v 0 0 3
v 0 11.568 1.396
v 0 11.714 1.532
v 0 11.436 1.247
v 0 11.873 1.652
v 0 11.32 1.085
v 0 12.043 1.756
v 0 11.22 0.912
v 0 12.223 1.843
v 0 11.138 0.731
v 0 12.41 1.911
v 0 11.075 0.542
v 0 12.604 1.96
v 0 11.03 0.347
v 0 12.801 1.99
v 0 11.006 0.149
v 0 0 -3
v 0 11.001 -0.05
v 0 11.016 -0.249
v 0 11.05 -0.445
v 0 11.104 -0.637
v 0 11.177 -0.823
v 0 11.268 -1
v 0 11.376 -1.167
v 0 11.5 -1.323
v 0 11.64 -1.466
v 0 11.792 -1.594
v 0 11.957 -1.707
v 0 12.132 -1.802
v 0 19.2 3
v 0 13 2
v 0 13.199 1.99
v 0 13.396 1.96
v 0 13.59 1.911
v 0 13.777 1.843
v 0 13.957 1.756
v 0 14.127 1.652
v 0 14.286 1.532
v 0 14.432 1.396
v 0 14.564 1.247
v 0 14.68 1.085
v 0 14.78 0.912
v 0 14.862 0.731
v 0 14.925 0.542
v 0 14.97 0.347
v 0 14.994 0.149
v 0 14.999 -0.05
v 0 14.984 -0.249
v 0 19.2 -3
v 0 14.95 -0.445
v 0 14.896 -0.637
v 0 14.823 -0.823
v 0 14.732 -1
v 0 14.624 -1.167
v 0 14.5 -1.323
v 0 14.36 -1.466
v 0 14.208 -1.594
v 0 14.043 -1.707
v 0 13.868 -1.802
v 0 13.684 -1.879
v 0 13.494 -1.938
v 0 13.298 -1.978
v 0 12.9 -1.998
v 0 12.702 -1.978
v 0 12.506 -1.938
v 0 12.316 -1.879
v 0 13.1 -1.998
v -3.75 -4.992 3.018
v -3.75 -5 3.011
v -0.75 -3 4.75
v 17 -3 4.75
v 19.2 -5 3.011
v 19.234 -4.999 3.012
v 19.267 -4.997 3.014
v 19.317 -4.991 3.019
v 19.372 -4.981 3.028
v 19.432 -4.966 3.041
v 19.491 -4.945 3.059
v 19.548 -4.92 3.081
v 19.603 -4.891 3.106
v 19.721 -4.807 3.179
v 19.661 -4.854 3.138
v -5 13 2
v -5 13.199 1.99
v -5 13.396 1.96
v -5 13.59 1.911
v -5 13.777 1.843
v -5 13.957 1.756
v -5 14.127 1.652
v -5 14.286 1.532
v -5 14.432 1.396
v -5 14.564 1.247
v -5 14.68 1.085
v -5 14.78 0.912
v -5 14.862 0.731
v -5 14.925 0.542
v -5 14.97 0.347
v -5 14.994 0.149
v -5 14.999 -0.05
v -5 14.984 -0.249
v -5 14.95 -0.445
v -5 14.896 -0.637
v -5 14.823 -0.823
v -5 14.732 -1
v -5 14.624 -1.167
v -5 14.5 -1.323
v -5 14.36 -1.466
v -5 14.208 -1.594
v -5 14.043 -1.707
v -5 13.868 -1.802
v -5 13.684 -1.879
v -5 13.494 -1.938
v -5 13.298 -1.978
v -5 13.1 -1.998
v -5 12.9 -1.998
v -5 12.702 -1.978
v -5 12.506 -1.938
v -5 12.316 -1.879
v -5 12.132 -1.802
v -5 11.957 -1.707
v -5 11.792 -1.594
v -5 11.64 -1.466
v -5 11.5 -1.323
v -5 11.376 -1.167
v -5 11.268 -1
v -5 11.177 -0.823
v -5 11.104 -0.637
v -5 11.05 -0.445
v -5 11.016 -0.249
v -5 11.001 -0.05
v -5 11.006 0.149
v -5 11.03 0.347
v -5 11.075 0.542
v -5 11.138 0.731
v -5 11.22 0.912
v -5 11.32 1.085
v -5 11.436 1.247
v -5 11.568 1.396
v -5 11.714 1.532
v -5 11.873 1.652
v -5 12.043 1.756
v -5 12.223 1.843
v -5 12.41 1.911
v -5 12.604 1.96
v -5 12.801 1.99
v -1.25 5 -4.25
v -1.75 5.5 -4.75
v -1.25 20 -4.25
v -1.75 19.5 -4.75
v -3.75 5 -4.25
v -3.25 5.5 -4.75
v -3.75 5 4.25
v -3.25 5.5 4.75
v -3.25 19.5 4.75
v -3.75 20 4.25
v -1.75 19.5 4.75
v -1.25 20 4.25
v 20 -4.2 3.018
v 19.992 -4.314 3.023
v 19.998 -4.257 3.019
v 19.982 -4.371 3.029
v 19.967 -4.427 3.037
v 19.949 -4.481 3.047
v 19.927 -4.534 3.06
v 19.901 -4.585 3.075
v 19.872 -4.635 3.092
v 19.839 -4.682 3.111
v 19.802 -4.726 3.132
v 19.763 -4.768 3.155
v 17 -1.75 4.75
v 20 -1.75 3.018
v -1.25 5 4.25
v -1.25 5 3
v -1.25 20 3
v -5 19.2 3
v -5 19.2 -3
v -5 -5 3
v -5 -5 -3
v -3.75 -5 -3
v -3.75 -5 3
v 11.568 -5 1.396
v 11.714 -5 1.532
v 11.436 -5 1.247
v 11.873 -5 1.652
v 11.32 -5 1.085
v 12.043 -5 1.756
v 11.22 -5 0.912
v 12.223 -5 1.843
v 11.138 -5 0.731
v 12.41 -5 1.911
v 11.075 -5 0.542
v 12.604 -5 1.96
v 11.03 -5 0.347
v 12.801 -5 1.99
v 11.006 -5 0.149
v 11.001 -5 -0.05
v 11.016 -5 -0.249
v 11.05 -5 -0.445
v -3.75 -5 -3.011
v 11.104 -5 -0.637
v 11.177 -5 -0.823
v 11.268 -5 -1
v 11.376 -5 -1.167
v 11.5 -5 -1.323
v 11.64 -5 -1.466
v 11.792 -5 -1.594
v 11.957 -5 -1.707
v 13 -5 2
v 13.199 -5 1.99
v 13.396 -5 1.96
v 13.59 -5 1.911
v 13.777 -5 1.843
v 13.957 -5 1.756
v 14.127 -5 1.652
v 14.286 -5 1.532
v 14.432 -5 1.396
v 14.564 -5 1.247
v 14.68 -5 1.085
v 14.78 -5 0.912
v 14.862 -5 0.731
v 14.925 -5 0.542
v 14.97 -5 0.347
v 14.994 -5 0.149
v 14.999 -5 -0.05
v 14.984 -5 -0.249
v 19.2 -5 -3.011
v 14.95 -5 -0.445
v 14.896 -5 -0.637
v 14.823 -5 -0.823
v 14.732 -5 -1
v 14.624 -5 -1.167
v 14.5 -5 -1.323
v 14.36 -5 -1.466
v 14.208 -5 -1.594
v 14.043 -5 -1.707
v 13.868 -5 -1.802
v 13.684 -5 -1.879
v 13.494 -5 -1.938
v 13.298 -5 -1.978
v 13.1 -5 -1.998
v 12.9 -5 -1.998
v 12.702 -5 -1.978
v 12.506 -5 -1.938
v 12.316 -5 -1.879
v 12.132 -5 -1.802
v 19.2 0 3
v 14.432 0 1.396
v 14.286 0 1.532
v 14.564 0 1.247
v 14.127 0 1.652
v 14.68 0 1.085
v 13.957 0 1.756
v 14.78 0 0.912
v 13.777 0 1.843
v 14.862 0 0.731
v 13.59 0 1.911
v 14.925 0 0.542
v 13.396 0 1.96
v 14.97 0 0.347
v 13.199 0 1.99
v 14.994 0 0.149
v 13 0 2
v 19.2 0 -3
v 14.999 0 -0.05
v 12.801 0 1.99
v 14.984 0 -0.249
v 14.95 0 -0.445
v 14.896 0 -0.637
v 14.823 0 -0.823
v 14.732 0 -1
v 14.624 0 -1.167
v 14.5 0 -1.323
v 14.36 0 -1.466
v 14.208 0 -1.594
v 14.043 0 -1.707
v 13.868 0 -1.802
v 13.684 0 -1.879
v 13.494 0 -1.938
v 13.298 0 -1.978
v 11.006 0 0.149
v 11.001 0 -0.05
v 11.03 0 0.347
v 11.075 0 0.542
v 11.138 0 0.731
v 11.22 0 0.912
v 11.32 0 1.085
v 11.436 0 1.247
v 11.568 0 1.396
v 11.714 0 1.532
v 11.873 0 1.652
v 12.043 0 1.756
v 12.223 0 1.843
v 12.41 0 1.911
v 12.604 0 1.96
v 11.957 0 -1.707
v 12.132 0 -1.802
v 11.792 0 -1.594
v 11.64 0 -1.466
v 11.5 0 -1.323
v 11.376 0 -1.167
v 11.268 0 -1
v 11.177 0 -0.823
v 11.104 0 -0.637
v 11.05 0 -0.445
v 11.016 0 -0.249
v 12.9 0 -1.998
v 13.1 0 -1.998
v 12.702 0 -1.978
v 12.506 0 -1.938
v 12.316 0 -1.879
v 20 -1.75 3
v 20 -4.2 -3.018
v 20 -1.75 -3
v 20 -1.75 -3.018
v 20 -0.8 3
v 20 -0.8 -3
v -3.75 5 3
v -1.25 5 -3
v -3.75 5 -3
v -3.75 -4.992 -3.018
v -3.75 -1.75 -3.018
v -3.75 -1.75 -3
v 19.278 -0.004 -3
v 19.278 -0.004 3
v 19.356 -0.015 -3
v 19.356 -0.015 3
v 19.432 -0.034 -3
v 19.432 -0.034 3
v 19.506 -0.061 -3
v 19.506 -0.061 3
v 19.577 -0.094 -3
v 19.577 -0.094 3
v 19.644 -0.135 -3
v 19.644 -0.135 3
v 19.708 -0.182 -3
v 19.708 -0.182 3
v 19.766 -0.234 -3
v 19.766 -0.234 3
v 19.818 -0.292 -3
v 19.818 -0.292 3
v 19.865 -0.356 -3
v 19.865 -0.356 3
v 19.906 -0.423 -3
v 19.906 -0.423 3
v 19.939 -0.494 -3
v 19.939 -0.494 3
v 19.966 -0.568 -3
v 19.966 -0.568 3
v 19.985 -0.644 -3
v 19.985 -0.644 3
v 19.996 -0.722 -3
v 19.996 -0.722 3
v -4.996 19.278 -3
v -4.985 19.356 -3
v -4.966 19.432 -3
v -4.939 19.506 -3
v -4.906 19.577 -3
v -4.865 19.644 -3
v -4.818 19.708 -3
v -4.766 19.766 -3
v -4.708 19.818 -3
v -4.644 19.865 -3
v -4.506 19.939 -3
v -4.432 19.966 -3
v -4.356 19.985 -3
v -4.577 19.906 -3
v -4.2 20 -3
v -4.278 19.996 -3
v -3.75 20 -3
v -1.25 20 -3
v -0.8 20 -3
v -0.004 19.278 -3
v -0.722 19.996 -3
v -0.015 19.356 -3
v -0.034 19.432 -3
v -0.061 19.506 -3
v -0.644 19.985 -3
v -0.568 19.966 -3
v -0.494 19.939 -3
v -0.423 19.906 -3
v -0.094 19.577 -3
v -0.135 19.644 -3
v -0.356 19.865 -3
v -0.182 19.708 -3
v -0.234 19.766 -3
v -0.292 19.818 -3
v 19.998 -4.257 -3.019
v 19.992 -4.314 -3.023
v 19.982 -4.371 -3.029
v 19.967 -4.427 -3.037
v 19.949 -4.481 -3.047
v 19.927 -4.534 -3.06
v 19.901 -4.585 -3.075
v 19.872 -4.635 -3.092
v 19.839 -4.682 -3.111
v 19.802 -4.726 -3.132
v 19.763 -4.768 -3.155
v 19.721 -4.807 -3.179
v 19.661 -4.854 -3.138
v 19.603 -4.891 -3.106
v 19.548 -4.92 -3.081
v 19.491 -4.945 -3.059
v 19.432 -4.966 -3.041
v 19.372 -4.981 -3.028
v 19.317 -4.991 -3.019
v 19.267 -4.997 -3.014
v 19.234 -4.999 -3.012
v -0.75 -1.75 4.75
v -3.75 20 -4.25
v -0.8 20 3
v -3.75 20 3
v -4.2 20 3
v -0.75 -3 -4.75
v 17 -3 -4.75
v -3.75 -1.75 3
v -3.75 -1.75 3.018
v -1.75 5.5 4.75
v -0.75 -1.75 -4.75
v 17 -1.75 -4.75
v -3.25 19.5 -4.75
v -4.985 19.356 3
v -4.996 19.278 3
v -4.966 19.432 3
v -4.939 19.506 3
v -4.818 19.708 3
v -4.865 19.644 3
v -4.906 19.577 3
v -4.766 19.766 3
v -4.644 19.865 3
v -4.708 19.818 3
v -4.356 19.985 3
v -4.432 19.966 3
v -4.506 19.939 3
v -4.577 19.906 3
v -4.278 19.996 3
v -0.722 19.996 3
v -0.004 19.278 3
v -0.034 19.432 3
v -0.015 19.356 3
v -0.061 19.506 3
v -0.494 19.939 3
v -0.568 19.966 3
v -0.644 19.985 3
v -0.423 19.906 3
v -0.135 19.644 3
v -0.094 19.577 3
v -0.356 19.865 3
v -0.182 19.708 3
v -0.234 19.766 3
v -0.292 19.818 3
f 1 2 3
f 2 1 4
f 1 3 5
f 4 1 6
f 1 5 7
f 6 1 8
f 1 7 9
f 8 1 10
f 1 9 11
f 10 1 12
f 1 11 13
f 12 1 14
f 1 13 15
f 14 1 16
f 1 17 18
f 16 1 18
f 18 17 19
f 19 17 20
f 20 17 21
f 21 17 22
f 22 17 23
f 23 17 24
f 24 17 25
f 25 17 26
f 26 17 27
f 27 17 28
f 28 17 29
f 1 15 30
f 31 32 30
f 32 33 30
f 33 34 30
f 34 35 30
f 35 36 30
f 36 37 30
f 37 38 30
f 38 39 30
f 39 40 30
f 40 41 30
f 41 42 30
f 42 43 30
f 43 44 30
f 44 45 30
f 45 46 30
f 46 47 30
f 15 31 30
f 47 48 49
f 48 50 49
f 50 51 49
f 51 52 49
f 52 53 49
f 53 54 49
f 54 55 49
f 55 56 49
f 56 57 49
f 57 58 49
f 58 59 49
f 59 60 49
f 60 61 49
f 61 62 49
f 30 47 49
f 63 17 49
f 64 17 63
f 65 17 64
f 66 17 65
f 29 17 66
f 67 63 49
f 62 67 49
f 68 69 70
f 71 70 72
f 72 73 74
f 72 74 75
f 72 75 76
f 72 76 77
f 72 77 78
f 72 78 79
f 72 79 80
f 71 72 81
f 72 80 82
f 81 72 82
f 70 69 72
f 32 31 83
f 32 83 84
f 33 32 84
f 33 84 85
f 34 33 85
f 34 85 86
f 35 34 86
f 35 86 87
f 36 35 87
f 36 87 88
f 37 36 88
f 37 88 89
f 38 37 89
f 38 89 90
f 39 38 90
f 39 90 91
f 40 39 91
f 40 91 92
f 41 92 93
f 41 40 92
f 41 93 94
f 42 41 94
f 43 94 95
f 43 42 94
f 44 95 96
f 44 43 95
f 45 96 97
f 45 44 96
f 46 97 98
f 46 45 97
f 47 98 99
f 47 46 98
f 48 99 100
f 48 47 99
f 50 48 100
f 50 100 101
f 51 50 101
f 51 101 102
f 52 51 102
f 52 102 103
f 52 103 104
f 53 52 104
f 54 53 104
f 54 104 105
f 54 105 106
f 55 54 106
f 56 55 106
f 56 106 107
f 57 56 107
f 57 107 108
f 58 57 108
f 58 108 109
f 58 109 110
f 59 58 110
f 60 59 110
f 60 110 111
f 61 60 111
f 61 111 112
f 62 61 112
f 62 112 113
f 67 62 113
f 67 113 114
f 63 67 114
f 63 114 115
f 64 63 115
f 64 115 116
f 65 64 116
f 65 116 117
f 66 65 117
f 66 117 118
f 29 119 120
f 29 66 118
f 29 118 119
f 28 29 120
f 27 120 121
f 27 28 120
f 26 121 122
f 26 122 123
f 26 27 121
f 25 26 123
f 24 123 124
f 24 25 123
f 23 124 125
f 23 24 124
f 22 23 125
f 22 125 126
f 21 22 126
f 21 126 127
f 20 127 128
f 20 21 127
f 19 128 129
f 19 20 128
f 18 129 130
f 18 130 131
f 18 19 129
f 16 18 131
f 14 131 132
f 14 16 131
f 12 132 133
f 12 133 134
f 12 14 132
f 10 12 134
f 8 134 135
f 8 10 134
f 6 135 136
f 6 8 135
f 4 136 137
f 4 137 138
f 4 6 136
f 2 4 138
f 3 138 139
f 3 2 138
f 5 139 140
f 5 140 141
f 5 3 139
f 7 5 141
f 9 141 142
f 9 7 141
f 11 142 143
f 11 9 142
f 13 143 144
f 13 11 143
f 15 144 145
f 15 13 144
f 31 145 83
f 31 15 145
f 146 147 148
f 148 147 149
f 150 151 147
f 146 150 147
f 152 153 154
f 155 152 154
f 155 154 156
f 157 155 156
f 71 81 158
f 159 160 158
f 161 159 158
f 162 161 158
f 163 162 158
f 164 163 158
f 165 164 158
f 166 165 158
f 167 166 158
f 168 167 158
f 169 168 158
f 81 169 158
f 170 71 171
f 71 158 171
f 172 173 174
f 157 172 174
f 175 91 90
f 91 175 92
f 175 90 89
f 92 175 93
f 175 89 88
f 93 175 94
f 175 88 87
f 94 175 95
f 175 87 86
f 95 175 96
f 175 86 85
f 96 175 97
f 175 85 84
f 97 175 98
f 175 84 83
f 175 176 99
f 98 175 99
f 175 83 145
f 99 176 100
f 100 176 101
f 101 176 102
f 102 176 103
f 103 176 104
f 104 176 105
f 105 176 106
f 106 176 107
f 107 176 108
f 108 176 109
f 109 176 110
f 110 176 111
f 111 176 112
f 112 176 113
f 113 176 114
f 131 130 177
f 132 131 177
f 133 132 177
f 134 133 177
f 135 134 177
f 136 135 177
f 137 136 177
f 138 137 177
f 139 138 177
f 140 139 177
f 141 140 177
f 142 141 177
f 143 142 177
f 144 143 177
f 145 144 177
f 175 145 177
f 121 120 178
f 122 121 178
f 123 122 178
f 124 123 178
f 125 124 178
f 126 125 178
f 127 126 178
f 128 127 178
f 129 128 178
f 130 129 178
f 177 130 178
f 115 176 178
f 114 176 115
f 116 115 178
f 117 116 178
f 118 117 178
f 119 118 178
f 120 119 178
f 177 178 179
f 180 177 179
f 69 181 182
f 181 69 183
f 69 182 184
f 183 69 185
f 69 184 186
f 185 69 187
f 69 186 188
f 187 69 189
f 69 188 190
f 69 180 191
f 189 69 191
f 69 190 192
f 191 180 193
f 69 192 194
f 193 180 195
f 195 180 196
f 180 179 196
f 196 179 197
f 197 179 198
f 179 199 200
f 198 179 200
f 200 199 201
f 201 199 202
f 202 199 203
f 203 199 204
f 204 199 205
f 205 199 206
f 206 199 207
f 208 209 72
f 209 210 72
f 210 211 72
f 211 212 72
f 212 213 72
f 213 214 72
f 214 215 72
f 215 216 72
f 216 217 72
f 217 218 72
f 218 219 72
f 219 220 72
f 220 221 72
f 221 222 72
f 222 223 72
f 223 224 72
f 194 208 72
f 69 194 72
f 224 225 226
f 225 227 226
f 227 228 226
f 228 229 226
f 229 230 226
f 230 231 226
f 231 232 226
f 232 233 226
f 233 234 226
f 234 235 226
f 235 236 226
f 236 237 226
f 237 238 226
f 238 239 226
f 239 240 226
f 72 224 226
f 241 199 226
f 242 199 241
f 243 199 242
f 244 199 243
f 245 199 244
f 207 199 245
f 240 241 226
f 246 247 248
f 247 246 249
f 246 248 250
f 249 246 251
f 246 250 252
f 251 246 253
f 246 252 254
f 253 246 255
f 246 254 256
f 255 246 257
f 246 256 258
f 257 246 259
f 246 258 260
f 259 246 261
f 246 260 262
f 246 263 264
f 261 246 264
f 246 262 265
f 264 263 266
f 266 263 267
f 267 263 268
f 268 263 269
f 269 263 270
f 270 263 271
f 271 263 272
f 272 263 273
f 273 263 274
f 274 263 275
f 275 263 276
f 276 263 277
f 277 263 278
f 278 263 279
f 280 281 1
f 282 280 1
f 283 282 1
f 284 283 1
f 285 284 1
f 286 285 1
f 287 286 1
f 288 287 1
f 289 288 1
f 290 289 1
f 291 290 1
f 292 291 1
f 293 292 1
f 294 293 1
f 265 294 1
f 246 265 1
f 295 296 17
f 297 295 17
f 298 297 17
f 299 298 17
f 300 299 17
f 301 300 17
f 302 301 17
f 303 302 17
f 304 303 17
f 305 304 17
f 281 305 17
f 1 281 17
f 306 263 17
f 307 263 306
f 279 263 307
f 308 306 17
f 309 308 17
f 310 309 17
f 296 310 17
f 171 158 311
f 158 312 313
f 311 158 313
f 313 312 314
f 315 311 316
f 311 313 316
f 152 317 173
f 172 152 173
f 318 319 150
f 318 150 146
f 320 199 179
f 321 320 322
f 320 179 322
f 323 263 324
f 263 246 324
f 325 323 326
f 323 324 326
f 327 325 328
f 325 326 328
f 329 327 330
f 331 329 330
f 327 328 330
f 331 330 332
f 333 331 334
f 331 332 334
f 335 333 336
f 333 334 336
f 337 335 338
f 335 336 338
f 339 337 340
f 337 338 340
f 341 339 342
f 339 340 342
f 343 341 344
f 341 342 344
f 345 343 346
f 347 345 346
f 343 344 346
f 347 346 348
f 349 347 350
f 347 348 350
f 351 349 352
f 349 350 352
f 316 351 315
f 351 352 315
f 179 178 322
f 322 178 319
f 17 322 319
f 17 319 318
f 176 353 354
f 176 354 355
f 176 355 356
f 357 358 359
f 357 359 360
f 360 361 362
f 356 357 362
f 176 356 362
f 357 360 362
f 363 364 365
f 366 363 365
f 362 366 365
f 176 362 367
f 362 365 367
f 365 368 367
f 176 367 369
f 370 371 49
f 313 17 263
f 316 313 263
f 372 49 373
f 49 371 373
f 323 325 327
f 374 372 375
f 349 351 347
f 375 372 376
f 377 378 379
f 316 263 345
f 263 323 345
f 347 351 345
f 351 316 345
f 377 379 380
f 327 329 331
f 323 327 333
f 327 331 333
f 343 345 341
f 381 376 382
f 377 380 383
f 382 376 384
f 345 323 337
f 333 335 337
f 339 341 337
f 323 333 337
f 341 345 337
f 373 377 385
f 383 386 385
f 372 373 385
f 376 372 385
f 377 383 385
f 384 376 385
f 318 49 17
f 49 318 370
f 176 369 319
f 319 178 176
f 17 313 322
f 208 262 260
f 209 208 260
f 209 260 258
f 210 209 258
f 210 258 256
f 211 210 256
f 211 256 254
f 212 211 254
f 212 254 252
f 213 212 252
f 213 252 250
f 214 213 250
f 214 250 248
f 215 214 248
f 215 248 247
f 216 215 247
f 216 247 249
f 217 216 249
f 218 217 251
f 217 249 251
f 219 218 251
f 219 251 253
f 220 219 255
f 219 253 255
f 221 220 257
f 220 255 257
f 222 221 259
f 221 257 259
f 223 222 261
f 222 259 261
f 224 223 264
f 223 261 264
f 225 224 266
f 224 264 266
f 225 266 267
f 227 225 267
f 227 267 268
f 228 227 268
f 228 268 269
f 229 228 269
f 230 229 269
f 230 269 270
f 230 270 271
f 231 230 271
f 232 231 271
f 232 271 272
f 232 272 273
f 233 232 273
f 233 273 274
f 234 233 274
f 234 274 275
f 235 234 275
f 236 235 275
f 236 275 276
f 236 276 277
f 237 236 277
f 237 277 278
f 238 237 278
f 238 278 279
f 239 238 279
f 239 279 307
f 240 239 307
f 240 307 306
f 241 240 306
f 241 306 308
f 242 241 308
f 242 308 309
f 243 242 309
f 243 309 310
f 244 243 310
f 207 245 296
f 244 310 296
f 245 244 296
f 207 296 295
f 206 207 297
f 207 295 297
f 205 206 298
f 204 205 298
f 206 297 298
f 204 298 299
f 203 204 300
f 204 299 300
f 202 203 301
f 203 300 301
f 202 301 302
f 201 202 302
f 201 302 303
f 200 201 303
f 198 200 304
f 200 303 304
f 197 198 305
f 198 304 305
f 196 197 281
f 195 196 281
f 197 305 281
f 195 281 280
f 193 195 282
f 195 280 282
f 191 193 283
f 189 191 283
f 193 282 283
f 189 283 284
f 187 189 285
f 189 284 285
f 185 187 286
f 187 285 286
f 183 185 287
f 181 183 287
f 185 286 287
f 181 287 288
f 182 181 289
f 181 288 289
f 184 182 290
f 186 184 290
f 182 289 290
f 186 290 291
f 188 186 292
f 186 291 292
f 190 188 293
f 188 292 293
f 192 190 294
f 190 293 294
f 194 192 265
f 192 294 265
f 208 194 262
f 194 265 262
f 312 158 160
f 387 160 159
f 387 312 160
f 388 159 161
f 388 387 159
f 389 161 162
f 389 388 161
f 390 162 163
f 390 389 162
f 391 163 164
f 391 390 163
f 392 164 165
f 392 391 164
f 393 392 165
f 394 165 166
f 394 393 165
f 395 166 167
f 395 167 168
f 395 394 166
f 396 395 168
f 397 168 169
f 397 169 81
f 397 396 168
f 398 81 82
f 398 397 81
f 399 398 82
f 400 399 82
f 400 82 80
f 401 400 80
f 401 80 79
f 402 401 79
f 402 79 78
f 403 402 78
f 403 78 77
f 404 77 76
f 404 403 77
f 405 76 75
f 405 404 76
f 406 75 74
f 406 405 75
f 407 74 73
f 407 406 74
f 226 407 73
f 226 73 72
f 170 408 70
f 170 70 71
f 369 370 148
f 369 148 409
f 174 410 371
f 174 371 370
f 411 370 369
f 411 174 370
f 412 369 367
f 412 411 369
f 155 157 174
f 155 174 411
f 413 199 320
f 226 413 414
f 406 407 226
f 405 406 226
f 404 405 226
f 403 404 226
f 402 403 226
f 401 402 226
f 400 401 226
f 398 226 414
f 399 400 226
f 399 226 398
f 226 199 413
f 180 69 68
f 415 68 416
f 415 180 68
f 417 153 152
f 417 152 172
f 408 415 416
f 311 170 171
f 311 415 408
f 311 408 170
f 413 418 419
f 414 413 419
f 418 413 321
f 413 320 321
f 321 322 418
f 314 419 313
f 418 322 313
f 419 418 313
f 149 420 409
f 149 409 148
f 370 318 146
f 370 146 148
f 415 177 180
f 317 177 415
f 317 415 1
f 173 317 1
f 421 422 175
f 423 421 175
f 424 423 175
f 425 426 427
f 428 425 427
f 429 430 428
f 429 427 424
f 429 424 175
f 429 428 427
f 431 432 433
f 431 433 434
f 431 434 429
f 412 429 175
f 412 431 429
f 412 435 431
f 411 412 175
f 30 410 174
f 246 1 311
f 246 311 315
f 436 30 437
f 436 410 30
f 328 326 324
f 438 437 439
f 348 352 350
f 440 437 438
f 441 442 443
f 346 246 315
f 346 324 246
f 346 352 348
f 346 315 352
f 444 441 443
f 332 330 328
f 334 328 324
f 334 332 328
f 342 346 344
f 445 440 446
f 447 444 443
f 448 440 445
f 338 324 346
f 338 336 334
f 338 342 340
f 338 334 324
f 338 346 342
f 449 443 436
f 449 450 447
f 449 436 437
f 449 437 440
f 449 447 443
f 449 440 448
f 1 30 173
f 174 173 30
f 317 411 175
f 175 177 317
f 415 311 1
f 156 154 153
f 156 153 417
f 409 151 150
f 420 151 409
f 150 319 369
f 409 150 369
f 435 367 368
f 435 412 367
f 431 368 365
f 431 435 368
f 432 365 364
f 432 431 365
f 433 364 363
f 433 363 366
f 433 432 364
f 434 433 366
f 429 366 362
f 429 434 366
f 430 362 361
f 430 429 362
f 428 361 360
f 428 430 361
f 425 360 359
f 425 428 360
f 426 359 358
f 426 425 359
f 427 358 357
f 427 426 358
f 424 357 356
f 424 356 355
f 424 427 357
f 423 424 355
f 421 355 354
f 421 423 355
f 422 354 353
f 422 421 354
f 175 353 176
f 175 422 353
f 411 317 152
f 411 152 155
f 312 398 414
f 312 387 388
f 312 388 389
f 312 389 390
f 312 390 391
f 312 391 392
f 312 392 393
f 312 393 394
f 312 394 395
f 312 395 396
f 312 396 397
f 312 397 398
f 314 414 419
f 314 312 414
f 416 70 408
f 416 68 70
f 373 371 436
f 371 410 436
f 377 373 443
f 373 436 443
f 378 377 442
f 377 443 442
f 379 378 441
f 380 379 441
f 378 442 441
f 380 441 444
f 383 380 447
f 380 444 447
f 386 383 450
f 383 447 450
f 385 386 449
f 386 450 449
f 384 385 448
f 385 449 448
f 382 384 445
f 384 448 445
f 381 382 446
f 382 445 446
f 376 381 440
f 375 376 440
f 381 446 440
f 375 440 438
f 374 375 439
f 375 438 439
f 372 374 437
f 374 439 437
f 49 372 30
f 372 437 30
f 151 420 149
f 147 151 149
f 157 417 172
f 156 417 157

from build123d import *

# Parameters (mm, degrees)
EXTRUDE1_DEPTH      = 3
EXTRUDE1_DEPTH_BACK = 3
SKETCH2_W           = 2.5
SKETCH2_H           = 15
SKETCH2_W_2         = 23.75
SKETCH2_H_2         = 3.25
EXTRUDE2_DEPTH      = 1.75
CHAMFER1_SIZE       = 3
CHAMFER1_SIZE2      = 1.732050808
CHAMFER2_SIZE       = 2
CHAMFER2_SIZE2      = 1.738573476
CHAMFER3_SIZE       = 0.5
EXTRUDE3_REACH      = 30.68
SKETCH4_R           = 2
FILLET1_R           = 0.8


# Read off the part's stored shape, not the designer's step: Mirror1
with BuildPart() as part:
    # Sketch1 → Extrude1 (new, two sides: drawn at the far end of the back side and taken through both)
    with BuildSketch(Plane.XY.offset(-EXTRUDE1_DEPTH_BACK)):
        Polygon((0, 0), (0, 20), (-5, 20), (-5, -5), (20, -5), (20, 0), align=None)
    extrude(amount=EXTRUDE1_DEPTH + EXTRUDE1_DEPTH_BACK)

    # Sketch2 → Extrude2 (add)
    with BuildSketch(Plane.XY.offset(3)):
        with Locations((-2.5, 12.5)):
            Rectangle(SKETCH2_W, SKETCH2_H)
        with Locations((8.125, -3.375)):
            Rectangle(SKETCH2_W_2, SKETCH2_H_2)
    extrude(amount=EXTRUDE2_DEPTH)

    # Chamfer1
    chamfer1_edges = [part.edges().sort_by_distance(p)[0] for p in [
        (20, -3.375, 4.75),
        (-3.75, -3.375, 4.75),
    ]]
    chamfer1_side = [part.faces().sort_by_distance(p)[0] for p in [
        (8.125, -3.375, 4.75),
    ]]
    chamfer(chamfer1_edges, length=CHAMFER1_SIZE, length2=CHAMFER1_SIZE2, reference=chamfer1_side[0])

    # Chamfer2
    chamfer2_edges = [part.edges().sort_by_distance(p)[0] for p in [
        (8.125, -5, 4.75),
    ]]
    chamfer2_side = [part.faces().sort_by_distance(p)[0] for p in [
        (8.125, -3.375, 4.75),
    ]]
    chamfer(chamfer2_edges, length=CHAMFER2_SIZE, length2=CHAMFER2_SIZE2, reference=chamfer2_side[0])

    # Chamfer3
    chamfer3_edges = [part.edges().sort_by_distance(p)[0] for p in [
        (-2.5, 20, 4.75),
        (-1.25, 12.5, 4.75),
        (-2.5, 5, 4.75),
        (-3.75, 12.5, 4.75),
    ]]
    chamfer(chamfer3_edges, length=CHAMFER3_SIZE)

    # Mirror1: part across plane


with BuildPart() as part_1:
    add(part.part)
    add(part.part.mirror(Plane.XY))

    # Sketch4 → Extrude3 (cut, up to next)
    with BuildSketch(Plane(origin=(0, 0, 0), x_dir=(1, 0, 0), z_dir=(0, 1, 0)), mode=Mode.PRIVATE) as extrude3_sk1:
        with Locations(Location((13, 0, 0), (0, 0, 270))):
            Circle(SKETCH4_R)
    extrude3_tool1 = extrude(extrude3_sk1.sketch, amount=-EXTRUDE3_REACH, mode=Mode.PRIVATE) & part_1.part
    extrude3 = extrude3_tool1.solids().sort_by_distance((13, 0, 0))[0]
    add(extrude3, mode=Mode.SUBTRACT)

    # Mirror2: Extrude3 across plane
    add(extrude3.mirror(Plane(origin=(0, 0, 0), x_dir=(0, 0, 1), z_dir=(0.7071067811865476, -0.7071067811865475, 0))), mode=Mode.SUBTRACT)

    # Fillet1
    fillet1_edges = [part_1.edges().sort_by_distance(p)[0] for p in [
        (-5, 20, 0),
        (20, -5, 0),
        (20, 0, 0),
        (0, 20, 0),
    ]]
    fillet(fillet1_edges, radius=FILLET1_R)


solid = part_1.part
